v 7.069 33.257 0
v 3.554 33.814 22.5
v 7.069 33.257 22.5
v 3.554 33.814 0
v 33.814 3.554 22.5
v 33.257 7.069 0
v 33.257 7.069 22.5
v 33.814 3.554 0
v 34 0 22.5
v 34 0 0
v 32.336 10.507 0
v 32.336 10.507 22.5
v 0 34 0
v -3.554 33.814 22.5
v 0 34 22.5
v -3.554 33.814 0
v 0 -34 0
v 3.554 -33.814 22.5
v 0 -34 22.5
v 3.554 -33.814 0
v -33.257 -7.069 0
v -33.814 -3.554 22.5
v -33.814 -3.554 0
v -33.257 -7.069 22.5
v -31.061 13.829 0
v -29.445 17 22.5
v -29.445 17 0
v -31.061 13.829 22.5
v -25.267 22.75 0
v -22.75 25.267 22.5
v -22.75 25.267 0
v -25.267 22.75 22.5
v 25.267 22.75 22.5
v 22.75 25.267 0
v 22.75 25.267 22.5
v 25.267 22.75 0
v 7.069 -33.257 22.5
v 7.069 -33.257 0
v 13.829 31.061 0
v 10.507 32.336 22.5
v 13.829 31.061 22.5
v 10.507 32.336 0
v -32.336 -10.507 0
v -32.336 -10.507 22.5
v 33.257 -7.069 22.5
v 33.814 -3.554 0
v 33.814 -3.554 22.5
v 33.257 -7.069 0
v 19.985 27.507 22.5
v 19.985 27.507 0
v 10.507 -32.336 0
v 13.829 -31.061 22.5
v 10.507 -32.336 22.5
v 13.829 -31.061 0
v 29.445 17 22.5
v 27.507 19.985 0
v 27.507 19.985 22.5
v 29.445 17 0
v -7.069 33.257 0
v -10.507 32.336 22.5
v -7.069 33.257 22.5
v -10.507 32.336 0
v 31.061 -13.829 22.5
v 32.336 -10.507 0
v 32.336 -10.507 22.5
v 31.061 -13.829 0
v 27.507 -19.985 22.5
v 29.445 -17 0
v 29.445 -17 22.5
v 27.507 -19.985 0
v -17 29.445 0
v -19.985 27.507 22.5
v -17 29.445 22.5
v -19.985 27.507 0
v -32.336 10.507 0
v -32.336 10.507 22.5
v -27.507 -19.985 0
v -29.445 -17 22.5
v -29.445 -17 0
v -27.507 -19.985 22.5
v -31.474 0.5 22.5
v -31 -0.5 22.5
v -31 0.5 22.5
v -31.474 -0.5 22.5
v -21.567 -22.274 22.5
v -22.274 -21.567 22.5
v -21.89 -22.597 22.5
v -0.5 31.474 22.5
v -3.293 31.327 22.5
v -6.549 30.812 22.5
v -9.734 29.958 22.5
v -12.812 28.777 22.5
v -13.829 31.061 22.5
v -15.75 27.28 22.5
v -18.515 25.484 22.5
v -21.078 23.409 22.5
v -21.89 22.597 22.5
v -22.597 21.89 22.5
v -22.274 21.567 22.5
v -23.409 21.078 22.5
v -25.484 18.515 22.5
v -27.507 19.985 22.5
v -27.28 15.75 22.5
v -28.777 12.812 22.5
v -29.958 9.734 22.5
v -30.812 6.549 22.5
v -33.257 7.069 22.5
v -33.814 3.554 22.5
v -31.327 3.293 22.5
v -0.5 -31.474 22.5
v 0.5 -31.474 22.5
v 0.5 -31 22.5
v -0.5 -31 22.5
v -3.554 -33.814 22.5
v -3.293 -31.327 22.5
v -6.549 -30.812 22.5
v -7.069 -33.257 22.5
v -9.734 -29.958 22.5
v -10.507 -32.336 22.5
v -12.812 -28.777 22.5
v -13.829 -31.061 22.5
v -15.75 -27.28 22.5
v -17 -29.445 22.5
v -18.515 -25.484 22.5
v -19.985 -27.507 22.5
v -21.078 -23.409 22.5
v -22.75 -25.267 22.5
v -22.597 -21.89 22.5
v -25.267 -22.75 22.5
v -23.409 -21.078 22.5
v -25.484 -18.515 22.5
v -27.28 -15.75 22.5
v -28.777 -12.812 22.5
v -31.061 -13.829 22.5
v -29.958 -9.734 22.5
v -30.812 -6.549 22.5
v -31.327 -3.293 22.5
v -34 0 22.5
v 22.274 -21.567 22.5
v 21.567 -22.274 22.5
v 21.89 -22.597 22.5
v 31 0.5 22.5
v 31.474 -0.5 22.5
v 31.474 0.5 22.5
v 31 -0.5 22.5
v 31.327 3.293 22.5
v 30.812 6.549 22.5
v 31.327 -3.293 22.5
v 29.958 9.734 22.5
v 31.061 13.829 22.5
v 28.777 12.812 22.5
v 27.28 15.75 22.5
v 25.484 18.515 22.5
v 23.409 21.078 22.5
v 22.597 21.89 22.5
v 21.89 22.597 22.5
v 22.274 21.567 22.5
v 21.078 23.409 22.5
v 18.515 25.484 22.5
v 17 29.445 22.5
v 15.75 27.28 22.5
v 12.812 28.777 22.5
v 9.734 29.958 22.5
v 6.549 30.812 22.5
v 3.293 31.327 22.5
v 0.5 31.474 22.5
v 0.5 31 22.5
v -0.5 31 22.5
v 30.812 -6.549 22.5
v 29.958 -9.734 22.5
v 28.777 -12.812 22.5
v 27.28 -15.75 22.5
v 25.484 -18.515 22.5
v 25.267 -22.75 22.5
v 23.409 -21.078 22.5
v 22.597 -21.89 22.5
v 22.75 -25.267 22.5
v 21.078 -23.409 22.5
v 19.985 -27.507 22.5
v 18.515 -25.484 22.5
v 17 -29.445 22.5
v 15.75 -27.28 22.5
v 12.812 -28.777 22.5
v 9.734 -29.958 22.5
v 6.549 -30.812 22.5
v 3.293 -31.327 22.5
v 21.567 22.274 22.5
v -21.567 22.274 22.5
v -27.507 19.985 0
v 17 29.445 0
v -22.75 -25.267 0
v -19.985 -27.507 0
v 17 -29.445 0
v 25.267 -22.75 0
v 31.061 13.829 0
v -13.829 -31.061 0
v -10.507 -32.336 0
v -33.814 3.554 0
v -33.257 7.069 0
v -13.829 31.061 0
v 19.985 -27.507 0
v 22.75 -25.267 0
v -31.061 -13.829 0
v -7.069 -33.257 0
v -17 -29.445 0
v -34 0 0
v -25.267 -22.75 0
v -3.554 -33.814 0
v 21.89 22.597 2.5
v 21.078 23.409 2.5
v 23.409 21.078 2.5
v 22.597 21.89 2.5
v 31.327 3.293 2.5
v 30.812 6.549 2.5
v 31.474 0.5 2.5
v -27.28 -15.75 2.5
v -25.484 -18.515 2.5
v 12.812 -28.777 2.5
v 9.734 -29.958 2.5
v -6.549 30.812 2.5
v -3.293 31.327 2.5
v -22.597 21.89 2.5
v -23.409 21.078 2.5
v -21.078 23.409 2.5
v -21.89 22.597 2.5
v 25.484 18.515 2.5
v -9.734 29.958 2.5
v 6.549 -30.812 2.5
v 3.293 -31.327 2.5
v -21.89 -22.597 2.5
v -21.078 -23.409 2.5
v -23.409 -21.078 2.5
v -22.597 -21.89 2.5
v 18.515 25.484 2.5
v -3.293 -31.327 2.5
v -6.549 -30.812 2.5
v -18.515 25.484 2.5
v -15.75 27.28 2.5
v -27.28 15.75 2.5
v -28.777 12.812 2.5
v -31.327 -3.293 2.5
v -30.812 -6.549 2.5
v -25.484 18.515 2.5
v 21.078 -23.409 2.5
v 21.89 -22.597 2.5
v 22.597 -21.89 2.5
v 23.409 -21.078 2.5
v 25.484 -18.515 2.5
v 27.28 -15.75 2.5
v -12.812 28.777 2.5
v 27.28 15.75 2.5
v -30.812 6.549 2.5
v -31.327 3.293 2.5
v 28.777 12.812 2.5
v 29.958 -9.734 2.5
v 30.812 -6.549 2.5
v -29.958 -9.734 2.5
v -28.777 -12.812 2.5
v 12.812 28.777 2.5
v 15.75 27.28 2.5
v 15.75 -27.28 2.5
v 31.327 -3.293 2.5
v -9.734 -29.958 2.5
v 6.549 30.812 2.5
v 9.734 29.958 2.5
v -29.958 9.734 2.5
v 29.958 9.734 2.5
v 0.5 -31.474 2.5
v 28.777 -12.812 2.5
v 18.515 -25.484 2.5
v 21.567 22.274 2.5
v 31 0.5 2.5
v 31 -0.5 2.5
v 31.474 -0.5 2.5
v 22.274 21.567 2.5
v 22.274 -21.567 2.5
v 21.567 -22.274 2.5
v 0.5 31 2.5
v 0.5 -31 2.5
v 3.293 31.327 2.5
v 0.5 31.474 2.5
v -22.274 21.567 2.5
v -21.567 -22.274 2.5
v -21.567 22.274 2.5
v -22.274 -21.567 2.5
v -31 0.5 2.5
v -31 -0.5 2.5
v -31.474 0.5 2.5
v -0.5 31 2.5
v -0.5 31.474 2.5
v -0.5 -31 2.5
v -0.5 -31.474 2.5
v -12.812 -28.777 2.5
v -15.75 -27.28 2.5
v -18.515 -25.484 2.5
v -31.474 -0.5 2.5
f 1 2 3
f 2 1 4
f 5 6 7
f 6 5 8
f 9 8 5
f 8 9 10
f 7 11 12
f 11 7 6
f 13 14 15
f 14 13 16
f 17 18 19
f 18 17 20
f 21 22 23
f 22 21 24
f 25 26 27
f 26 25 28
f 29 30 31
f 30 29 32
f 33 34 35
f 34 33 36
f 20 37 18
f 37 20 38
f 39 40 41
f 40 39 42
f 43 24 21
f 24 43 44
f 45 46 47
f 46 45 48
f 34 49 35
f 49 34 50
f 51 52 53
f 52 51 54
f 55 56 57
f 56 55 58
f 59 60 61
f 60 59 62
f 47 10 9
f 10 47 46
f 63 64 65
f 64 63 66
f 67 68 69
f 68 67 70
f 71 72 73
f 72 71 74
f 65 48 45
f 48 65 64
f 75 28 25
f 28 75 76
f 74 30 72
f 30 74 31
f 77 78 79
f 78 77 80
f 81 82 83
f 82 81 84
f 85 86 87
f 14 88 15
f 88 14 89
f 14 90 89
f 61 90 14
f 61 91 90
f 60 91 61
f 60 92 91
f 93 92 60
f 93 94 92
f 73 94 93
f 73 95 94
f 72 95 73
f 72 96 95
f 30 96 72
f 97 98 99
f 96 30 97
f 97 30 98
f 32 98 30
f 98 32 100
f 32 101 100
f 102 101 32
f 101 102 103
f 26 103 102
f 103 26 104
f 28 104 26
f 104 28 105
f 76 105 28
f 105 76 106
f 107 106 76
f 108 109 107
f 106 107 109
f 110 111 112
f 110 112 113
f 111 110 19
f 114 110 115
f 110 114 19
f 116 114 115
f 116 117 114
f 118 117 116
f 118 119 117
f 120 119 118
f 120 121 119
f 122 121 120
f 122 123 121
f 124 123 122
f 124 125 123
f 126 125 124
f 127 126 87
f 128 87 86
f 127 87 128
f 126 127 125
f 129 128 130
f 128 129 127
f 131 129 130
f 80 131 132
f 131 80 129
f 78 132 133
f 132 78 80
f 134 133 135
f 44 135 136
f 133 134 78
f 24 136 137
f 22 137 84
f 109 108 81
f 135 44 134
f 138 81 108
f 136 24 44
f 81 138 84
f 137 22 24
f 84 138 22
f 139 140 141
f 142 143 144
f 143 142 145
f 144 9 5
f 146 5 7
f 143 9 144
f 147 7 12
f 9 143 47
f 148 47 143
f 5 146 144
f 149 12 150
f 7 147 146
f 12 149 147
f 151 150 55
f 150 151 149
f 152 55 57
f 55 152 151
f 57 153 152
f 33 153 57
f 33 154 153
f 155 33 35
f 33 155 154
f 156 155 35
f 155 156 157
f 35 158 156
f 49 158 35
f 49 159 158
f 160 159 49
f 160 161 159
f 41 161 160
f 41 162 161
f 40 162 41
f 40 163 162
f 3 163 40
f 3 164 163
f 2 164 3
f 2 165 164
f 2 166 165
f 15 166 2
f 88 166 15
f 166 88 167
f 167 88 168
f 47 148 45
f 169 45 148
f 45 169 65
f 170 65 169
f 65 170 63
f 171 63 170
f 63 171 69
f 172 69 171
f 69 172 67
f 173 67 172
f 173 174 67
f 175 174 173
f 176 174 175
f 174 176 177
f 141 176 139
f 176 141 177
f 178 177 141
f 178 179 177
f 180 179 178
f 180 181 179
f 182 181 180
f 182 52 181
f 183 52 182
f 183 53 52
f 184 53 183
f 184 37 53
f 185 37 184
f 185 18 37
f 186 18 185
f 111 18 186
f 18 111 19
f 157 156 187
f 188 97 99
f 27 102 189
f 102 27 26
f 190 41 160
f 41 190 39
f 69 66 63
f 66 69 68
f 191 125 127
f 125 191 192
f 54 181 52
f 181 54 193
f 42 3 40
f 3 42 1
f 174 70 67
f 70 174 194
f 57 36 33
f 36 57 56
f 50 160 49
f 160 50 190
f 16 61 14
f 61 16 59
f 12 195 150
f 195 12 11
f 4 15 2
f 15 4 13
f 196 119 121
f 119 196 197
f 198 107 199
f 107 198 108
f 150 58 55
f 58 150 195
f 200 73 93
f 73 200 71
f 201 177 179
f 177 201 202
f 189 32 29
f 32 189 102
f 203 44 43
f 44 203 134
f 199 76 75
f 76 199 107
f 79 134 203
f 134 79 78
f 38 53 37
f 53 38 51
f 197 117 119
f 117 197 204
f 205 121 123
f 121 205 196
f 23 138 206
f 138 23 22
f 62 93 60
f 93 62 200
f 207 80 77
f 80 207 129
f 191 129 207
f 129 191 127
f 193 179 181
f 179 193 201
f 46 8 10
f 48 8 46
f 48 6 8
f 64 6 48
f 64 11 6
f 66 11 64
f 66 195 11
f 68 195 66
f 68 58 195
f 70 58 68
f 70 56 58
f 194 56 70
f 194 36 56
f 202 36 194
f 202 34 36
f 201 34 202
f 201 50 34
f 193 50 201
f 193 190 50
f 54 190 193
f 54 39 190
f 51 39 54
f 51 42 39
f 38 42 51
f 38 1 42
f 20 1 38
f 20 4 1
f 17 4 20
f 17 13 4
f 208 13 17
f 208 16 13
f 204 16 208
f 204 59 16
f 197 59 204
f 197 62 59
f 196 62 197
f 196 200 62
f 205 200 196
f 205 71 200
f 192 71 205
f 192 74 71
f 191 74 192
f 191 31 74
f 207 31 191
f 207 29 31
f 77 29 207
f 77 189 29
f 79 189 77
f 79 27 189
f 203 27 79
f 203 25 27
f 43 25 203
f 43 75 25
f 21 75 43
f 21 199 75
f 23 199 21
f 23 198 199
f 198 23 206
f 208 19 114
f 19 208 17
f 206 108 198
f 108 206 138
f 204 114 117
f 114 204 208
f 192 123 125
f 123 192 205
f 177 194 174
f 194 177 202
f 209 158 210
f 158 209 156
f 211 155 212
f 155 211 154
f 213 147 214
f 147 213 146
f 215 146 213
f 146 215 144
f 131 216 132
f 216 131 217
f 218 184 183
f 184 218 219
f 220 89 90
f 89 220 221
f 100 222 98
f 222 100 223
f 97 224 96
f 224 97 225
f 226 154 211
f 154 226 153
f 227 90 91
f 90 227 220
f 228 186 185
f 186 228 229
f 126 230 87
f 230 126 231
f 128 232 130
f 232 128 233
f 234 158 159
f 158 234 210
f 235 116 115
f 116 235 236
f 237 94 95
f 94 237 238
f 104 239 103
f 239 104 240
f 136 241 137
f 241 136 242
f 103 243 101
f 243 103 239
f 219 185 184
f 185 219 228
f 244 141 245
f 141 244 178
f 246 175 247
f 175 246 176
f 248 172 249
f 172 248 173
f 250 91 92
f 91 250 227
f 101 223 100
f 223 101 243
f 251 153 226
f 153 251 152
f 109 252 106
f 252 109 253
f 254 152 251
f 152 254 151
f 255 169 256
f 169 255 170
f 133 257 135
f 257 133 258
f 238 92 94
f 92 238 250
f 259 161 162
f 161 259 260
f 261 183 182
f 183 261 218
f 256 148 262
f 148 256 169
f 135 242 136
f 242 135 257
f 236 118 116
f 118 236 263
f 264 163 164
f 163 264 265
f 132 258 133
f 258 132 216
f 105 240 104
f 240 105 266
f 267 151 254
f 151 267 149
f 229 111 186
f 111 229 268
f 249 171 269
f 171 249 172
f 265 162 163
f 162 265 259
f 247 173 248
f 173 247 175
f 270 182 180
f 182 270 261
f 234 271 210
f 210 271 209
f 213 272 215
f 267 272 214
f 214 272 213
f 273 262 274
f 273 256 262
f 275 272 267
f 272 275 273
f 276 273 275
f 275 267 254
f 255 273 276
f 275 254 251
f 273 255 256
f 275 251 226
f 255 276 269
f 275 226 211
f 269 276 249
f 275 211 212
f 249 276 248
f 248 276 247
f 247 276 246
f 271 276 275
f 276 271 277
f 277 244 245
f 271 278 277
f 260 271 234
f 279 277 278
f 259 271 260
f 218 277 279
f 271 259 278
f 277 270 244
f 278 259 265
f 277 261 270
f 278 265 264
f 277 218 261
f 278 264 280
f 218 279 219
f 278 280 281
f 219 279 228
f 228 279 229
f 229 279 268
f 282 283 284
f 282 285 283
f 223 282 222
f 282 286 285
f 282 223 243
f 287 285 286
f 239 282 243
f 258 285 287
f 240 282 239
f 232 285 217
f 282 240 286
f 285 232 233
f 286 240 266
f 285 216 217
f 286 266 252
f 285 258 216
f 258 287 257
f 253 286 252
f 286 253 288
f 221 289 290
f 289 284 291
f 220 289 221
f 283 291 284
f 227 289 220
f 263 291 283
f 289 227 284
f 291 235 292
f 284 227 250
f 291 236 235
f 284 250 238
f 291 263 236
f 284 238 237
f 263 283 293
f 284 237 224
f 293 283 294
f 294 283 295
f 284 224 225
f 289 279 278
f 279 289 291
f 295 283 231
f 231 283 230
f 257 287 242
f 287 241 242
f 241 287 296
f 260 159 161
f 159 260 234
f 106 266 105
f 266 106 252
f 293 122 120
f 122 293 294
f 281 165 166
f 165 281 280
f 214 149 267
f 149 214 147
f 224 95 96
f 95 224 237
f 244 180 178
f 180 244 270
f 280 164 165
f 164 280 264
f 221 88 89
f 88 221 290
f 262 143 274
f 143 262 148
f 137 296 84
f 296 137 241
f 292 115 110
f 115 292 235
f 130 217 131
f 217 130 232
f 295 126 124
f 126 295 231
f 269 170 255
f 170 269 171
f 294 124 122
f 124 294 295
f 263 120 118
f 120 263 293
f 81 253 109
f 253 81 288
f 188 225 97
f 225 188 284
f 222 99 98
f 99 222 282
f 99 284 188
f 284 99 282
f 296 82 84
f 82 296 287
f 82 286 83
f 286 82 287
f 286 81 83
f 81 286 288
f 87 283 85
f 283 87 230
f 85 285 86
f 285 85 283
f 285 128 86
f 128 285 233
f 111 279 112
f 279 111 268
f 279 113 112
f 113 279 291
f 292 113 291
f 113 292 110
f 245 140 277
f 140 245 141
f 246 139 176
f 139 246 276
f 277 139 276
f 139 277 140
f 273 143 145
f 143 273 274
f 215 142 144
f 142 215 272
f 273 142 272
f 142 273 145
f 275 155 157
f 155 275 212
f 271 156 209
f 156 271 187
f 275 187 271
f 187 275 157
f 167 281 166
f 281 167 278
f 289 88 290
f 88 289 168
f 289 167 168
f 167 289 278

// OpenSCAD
diameter = 62; // mm
thickness = 2.5; // mm
height=20; //mm
fins=8;

$fn = 60;

difference() {
    cylinder(r=diameter/2 + thickness + 0.5, h= height + thickness);
    translate([0,0,thickness]) {
        cylinder(r=diameter/2 + 0.5, h=height);
    }
}

for (x=[1:fins]) {
    rotate([0,0,x*360/fins]) {
        translate([-0.5,diameter/2,0]) {
            cube([1,1,height + thickness]);
        }
    }
}
